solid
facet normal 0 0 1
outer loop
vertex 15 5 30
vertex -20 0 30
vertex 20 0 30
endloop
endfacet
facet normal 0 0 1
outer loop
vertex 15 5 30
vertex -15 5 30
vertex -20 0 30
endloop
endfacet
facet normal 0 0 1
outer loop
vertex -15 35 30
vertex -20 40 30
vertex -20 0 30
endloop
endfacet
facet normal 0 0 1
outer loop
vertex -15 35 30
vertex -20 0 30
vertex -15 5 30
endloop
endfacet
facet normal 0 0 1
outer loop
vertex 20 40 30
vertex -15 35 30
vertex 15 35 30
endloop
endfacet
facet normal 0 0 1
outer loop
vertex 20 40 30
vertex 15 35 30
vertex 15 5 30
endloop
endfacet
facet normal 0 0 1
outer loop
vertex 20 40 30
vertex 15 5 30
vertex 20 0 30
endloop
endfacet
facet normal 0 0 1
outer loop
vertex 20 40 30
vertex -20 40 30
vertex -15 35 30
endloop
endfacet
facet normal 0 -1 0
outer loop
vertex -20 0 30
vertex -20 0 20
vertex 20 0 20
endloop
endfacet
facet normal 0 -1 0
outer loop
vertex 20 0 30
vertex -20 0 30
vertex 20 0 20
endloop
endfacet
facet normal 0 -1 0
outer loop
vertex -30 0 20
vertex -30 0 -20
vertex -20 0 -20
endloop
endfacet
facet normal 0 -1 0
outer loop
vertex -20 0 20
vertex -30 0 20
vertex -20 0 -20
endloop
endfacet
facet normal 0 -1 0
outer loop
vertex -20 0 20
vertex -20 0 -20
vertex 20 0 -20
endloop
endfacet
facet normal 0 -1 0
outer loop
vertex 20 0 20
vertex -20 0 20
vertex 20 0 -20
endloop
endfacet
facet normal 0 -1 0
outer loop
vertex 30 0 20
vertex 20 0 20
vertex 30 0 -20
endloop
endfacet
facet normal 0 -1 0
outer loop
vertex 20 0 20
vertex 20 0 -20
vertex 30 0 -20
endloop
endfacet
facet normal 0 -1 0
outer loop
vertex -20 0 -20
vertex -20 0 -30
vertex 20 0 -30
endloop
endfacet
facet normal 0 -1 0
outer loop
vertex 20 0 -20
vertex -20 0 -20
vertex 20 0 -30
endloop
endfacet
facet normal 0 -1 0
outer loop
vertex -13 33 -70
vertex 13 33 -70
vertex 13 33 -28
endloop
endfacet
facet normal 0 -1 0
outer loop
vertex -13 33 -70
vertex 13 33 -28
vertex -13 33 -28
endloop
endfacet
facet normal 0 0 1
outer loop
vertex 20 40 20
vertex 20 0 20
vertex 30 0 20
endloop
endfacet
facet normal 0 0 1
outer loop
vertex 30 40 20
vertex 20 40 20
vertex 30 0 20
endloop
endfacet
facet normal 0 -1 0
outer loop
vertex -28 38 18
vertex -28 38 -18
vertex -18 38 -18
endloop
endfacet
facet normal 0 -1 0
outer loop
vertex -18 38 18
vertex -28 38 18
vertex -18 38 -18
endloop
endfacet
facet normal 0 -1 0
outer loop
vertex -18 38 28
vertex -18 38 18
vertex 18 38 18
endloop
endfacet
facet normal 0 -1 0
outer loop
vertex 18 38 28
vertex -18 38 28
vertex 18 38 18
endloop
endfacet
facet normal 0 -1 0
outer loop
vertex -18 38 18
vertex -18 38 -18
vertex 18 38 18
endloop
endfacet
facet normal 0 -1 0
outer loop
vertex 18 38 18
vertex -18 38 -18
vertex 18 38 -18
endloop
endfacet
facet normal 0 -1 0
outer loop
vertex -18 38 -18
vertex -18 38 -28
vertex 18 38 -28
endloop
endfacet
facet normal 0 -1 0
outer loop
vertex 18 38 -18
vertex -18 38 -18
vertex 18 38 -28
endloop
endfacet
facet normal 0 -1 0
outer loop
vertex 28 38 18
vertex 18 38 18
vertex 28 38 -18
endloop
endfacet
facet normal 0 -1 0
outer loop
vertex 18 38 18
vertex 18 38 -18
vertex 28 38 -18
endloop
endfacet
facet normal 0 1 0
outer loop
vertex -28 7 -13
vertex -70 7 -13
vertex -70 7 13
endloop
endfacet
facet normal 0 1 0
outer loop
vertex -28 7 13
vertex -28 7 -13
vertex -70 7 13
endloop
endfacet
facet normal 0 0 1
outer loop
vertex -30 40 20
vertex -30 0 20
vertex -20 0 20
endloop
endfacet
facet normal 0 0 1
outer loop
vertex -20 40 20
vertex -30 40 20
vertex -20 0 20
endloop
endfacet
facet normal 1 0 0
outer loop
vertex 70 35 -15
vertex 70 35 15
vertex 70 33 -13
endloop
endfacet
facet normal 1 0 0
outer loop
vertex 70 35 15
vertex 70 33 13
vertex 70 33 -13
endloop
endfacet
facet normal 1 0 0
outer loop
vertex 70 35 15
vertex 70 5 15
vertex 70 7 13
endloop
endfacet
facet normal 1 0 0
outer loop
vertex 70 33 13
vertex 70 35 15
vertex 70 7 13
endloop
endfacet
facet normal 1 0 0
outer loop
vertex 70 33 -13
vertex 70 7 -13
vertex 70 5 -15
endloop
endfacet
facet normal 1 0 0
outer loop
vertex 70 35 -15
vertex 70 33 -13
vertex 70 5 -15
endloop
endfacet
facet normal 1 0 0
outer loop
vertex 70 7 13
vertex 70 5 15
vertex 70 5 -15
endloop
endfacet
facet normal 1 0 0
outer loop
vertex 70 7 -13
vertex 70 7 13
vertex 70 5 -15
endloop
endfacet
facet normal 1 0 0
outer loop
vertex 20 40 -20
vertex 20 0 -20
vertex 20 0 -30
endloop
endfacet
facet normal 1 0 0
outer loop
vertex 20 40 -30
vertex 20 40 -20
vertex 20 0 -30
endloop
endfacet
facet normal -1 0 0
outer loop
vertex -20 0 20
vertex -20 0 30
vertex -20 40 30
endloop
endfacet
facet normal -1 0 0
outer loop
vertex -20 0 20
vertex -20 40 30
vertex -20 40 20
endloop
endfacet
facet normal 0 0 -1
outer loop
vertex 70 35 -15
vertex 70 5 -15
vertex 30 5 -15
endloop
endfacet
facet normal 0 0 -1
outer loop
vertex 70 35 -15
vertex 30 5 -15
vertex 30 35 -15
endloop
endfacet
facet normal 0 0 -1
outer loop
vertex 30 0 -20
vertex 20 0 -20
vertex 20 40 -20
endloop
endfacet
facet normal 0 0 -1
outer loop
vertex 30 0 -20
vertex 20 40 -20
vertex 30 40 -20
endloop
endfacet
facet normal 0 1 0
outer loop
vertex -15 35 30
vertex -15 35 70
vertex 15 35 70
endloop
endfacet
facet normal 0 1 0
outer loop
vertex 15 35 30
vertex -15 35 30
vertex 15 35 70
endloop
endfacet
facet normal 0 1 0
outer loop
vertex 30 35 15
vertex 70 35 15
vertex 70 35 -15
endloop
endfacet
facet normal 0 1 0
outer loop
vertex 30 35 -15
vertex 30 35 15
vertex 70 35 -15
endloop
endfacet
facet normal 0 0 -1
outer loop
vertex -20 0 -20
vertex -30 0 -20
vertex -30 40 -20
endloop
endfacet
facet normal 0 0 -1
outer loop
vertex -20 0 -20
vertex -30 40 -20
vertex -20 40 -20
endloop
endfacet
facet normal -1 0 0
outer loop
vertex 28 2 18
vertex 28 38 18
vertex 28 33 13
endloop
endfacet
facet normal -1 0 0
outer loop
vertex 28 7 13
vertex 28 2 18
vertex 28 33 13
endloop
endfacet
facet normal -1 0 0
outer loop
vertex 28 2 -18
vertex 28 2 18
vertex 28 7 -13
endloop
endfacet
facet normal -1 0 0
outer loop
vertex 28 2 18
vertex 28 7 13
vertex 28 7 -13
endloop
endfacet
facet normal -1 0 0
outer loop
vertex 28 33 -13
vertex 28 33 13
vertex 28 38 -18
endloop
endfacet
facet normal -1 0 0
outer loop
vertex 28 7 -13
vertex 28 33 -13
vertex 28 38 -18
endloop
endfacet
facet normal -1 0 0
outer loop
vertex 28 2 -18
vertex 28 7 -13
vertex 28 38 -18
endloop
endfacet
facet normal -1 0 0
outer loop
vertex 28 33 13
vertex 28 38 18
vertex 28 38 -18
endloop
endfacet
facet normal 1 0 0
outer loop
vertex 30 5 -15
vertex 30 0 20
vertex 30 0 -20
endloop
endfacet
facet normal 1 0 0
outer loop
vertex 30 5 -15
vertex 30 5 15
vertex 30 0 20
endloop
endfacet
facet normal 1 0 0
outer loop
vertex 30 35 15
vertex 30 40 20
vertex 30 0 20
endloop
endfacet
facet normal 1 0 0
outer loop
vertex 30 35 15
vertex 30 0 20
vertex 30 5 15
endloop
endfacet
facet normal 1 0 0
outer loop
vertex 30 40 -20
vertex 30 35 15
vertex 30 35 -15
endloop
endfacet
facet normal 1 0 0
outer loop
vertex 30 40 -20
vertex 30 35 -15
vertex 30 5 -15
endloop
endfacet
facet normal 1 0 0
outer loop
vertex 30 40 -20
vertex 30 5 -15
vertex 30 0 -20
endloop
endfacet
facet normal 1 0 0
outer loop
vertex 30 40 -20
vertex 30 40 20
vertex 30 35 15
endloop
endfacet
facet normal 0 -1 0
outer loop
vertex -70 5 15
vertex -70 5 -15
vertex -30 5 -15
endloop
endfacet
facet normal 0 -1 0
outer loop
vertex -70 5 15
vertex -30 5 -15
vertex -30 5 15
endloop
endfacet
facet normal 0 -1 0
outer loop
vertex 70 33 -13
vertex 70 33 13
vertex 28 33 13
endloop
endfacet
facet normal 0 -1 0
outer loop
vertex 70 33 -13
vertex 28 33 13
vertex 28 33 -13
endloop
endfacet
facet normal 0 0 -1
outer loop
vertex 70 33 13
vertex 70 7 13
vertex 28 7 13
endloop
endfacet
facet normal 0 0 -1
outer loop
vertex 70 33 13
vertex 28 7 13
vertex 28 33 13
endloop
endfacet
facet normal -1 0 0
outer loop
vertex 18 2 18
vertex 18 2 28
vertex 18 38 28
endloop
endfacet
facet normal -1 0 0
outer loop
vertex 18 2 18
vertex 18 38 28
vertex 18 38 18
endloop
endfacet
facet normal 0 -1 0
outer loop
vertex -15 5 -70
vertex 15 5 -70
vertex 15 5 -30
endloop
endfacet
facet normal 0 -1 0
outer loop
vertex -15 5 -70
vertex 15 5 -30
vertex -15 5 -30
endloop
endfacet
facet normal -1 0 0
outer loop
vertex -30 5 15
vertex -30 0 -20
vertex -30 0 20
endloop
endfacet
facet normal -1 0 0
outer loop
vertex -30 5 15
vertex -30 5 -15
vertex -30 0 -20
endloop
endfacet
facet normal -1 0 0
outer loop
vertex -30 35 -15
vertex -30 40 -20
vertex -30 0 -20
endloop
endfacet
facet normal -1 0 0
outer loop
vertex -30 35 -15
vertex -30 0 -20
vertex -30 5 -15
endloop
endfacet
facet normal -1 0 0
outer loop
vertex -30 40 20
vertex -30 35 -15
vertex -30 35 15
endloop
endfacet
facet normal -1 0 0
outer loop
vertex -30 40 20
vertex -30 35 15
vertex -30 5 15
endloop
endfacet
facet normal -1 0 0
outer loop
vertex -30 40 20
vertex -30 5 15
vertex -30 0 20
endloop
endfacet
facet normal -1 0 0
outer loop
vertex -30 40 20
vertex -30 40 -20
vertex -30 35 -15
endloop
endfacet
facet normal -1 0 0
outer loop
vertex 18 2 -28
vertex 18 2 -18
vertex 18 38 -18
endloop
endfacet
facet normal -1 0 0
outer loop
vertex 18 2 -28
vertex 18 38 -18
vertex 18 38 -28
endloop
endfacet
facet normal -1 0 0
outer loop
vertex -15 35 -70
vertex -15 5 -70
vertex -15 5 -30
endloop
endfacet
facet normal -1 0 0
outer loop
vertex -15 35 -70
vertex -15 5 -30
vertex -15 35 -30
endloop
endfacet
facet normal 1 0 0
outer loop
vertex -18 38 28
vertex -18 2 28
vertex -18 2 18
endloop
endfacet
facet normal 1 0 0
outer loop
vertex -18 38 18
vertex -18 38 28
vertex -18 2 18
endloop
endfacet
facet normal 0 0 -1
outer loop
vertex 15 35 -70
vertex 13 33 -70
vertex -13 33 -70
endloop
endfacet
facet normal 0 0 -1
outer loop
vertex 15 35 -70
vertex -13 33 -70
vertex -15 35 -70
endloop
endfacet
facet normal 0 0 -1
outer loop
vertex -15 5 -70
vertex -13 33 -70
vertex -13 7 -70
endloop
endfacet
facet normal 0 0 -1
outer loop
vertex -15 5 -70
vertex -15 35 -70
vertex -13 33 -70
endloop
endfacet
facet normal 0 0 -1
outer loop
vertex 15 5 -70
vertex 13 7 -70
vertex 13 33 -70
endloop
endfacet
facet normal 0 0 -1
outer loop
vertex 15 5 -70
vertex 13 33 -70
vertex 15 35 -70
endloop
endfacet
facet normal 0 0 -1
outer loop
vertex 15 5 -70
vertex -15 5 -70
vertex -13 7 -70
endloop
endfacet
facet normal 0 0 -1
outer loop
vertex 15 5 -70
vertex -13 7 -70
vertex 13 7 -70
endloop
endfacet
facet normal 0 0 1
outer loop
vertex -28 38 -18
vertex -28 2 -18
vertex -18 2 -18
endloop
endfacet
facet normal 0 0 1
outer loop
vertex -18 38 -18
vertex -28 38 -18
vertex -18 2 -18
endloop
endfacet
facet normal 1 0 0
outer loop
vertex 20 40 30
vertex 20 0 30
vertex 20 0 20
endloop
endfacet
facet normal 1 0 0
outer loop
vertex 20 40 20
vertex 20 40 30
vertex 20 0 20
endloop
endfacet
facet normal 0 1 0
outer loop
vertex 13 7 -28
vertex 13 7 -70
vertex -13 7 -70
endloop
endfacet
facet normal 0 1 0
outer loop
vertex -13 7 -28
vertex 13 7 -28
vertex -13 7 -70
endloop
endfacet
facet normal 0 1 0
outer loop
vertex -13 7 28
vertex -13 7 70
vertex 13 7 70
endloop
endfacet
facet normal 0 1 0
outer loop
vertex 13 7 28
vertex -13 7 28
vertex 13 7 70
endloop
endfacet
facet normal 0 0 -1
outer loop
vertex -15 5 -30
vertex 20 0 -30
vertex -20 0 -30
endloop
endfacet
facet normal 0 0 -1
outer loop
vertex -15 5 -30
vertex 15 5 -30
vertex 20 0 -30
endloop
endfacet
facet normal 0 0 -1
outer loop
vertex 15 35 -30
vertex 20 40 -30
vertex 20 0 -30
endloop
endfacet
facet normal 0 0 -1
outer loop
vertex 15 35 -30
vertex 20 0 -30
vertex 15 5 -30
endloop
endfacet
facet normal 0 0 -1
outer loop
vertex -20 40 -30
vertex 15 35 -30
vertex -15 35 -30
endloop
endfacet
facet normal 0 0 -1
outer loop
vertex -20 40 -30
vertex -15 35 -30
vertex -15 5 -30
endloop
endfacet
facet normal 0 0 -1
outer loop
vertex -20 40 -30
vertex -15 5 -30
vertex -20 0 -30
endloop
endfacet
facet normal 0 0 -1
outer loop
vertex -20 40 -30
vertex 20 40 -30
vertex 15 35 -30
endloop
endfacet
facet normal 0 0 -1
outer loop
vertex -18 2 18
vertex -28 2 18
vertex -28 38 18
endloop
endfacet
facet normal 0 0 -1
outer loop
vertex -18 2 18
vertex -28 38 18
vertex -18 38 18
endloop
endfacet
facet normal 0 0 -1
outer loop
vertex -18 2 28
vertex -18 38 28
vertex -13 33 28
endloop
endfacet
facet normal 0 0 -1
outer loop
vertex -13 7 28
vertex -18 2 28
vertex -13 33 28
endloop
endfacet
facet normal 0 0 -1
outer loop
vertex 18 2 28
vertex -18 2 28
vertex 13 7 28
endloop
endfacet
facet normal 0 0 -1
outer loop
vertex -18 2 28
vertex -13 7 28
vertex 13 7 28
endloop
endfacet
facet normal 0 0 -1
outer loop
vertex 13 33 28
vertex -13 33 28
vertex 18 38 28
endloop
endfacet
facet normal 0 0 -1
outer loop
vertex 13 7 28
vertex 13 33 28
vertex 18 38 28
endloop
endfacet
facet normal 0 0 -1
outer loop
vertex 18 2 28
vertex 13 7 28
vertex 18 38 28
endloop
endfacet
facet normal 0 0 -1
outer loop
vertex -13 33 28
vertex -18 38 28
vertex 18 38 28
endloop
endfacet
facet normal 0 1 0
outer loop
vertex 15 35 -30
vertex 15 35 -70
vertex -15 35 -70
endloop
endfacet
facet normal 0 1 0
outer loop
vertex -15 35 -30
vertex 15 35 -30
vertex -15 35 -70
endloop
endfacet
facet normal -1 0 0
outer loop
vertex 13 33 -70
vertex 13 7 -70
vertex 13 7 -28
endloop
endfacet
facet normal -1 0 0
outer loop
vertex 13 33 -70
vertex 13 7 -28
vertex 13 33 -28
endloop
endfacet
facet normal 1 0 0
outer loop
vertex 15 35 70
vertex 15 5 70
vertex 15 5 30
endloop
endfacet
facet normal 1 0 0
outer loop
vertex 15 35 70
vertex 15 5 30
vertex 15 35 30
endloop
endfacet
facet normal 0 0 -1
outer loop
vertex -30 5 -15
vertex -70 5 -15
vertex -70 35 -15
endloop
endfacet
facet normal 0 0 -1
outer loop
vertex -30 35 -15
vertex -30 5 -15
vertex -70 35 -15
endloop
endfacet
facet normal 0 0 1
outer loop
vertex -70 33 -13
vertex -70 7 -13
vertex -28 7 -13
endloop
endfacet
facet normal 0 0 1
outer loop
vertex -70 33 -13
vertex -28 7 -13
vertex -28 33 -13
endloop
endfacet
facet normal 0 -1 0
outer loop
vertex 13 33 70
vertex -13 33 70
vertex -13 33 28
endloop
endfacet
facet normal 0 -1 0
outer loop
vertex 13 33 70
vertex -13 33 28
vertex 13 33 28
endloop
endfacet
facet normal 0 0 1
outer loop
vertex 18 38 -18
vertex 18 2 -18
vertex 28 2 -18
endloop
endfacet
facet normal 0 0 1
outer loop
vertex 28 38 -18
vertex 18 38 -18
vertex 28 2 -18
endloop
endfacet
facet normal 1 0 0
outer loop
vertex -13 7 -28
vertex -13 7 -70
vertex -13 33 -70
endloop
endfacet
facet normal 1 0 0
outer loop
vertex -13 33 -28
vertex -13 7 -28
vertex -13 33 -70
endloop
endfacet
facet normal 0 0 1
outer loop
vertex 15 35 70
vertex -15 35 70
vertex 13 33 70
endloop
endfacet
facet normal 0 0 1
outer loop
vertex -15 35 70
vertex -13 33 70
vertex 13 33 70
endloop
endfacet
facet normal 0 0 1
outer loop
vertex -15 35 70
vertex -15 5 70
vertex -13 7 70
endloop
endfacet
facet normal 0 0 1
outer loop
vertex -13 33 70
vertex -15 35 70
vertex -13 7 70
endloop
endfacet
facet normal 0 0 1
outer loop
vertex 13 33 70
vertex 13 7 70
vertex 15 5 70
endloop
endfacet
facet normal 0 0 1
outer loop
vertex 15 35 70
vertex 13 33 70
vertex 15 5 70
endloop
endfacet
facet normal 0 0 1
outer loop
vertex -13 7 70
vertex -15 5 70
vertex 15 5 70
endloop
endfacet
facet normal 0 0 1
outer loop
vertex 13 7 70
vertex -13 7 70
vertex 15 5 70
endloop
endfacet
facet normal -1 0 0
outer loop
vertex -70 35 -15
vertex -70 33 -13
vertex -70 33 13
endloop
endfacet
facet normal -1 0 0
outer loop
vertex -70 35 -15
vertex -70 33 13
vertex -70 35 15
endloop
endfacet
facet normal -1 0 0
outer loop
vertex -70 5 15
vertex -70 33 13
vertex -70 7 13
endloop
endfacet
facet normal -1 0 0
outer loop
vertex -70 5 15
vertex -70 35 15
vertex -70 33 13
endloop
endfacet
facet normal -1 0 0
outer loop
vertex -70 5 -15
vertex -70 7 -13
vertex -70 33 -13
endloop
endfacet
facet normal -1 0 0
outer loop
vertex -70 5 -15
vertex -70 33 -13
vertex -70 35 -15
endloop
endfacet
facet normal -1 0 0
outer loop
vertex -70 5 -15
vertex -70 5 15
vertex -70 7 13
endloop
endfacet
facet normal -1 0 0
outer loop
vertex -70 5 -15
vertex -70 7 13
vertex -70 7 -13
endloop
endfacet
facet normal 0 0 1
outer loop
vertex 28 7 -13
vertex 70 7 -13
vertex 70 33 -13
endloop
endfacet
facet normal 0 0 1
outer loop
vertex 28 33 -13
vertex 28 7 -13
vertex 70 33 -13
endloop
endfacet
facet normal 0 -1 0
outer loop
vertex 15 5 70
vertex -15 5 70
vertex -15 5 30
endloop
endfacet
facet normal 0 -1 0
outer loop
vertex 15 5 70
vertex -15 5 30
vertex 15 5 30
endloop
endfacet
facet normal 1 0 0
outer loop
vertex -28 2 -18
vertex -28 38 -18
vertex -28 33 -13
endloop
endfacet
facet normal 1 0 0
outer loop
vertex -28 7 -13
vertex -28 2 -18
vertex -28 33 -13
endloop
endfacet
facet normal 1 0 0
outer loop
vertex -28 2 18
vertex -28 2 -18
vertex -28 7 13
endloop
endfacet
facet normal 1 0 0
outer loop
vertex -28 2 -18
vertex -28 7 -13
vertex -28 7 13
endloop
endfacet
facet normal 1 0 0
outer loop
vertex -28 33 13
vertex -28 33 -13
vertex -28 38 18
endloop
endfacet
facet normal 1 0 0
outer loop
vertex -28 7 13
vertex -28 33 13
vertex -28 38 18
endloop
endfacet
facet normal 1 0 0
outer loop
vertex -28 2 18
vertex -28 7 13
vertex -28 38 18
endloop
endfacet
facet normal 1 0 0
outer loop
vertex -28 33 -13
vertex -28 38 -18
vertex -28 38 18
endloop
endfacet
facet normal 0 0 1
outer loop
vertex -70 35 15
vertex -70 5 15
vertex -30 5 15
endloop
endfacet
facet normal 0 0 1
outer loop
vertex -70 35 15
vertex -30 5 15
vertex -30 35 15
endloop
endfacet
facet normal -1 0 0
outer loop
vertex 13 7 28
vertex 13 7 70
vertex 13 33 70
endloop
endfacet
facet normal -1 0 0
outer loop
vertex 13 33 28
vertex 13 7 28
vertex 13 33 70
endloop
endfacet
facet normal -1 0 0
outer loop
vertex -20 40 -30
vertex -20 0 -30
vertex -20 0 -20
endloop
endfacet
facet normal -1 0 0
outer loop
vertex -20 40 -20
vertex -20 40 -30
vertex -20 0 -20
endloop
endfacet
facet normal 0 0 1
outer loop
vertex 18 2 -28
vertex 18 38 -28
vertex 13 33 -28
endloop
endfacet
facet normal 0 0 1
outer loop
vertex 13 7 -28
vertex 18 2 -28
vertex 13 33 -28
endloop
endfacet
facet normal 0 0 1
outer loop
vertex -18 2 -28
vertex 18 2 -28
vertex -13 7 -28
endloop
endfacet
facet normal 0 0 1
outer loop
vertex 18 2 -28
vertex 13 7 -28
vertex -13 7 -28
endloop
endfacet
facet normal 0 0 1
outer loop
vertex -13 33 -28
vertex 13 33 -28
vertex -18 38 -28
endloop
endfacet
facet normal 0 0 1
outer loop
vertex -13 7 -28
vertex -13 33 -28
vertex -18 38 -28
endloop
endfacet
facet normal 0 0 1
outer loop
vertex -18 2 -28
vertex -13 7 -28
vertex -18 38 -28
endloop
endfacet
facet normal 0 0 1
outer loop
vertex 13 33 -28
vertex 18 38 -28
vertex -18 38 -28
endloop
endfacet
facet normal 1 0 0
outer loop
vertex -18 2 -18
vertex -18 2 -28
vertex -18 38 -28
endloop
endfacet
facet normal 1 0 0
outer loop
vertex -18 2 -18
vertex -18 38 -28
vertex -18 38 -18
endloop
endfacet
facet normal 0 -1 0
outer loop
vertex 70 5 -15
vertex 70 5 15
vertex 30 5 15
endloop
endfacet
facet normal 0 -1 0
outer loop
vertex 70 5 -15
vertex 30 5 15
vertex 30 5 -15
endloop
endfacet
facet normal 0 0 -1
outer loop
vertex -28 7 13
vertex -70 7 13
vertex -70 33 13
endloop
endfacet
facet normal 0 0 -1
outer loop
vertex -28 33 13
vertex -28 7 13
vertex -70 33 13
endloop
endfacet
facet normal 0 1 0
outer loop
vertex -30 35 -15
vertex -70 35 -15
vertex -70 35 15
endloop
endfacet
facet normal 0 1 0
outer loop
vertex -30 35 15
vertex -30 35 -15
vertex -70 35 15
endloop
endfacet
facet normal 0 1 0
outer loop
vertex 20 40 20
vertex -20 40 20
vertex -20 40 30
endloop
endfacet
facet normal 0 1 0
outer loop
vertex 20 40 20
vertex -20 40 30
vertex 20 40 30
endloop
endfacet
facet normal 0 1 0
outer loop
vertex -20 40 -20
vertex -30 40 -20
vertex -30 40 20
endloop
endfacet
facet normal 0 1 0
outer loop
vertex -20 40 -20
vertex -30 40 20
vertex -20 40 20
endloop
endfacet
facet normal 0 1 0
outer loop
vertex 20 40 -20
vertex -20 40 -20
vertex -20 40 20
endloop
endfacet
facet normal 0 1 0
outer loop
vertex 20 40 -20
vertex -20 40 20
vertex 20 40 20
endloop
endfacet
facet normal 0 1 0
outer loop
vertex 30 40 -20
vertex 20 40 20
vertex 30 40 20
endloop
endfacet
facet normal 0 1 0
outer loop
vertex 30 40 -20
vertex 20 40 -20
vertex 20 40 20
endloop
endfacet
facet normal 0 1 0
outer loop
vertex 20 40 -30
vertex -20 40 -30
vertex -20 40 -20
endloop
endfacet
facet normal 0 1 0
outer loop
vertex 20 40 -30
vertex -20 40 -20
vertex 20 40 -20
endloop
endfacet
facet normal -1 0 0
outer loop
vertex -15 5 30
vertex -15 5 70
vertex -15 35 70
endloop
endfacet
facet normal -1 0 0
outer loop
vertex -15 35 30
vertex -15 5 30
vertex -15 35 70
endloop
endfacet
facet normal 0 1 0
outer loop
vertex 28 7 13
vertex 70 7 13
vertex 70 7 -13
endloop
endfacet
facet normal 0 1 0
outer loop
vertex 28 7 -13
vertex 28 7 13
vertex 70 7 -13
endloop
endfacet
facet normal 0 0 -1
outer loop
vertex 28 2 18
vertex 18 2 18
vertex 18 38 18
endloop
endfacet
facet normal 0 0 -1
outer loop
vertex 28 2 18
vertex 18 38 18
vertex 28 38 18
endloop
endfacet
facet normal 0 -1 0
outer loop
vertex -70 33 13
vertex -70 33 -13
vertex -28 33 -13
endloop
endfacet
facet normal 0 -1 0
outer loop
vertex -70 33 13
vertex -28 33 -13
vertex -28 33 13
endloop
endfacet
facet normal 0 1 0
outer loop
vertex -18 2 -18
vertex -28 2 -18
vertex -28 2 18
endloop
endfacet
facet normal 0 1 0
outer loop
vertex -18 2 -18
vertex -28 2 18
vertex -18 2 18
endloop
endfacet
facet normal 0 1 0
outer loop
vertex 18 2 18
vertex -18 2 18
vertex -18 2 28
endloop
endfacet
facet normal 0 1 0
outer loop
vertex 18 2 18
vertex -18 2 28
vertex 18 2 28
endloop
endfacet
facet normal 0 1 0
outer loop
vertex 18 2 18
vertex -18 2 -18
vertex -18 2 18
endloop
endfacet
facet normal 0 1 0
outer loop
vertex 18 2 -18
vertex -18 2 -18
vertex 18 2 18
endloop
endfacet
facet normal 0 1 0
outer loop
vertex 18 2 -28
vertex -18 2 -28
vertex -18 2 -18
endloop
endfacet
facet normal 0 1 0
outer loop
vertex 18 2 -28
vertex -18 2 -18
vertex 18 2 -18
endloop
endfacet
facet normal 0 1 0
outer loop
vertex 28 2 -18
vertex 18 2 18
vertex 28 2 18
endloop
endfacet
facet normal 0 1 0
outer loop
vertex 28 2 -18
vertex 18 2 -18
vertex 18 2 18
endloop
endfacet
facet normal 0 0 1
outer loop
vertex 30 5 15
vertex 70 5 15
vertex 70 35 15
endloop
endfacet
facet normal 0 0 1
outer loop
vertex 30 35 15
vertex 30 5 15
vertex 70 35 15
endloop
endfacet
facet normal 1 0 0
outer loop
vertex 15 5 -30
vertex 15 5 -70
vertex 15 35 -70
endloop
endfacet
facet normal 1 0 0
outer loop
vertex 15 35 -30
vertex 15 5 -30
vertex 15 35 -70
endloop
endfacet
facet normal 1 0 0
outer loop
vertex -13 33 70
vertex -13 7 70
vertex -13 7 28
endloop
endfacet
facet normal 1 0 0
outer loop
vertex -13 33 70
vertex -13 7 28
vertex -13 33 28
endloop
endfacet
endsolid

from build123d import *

# Parameters (mm, degrees)
CROQUIS1_W     = 40
CROQUIS1_H     = 50
CROQUIS1_H_2   = 40
CROQUIS1_W_2   = 50
EXTRUIR1_DEPTH = 40
CROQUIS2_W     = 40
CROQUIS2_H     = 40
CROQUIS2_W_2   = 30
CROQUIS2_H_2   = 30
EXTRUIR2_DEPTH = 40
CROQUIS3_W     = 40
CROQUIS3_H     = 40
CROQUIS3_W_2   = 30
CROQUIS3_H_2   = 30
EXTRUIR3_DEPTH = 40
CROQUIS5_W     = 40
CROQUIS5_H     = 40
CROQUIS5_W_2   = 30
CROQUIS5_H_2   = 30
EXTRUIR4_DEPTH = 40
CROQUIS6_W     = 40
CROQUIS6_H     = 40
CROQUIS6_W_2   = 30
CROQUIS6_H_2   = 30
EXTRUIR5_DEPTH = 40
VACIADO1_T     = -2


with BuildPart() as part:
    # Croquis1 → Extruir1 (new body)
    with BuildSketch(Plane(origin=(0, 0, 0), x_dir=(1, 0, 0), z_dir=(0, 1, 0))):
        with Locations((0, 45)):
            Rectangle(CROQUIS1_W, CROQUIS1_H)
        Rectangle(CROQUIS1_W, CROQUIS1_H_2)
        with Locations((45, 0)):
            Rectangle(CROQUIS1_W_2, CROQUIS1_H_2)
        with Locations((-45, 0)):
            Rectangle(CROQUIS1_W_2, CROQUIS1_H_2)
        with Locations((0, -45)):
            Rectangle(CROQUIS1_W, CROQUIS1_H)
    extrude(amount=EXTRUIR1_DEPTH)

    # Croquis2 → Extruir2 (cut)
    with BuildSketch(Plane(origin=(70, 0, 0), x_dir=(0, 0, -1), z_dir=(1, 0, 0))):
        with Locations((0, 20)):
            Rectangle(CROQUIS2_W, CROQUIS2_H)
        with Locations((0, 20)):
            Rectangle(CROQUIS2_W_2, CROQUIS2_H_2, mode=Mode.SUBTRACT)
    extrude(amount=-EXTRUIR2_DEPTH, mode=Mode.SUBTRACT)

    # Croquis3 → Extruir3 (cut)
    with BuildSketch(Plane(origin=(0, 0, -70), x_dir=(-1, 0, 0), z_dir=(0, 0, -1))):
        with Locations((0, 20)):
            Rectangle(CROQUIS3_W, CROQUIS3_H)
        with Locations((0, 20)):
            Rectangle(CROQUIS3_W_2, CROQUIS3_H_2, mode=Mode.SUBTRACT)
    extrude(amount=-EXTRUIR3_DEPTH, mode=Mode.SUBTRACT)

    # Croquis5 → Extruir4 (cut)
    with BuildSketch(Plane.ZY.offset(70)):
        with Locations((0, 20)):
            Rectangle(CROQUIS5_W, CROQUIS5_H)
        with Locations((0, 20)):
            Rectangle(CROQUIS5_W_2, CROQUIS5_H_2, mode=Mode.SUBTRACT)
    extrude(amount=-EXTRUIR4_DEPTH, mode=Mode.SUBTRACT)

    # Croquis6 → Extruir5 (cut)
    with BuildSketch(Plane.XY.offset(70)):
        with Locations((0, 20)):
            Rectangle(CROQUIS6_W, CROQUIS6_H)
        with Locations((0, 20)):
            Rectangle(CROQUIS6_W_2, CROQUIS6_H_2, mode=Mode.SUBTRACT)
    extrude(amount=-EXTRUIR5_DEPTH, mode=Mode.SUBTRACT)

    # Vaciado1
    vaciado1_openings = [part.faces().sort_by_distance(p)[0] for p in [
        (0, 20, 70),
        (70, 20, 0),
        (0, 20, -70),
        (-70, 20, 0),
    ]]
    offset(amount=VACIADO1_T, openings=vaciado1_openings, kind=Kind.INTERSECTION)


solid = part.part
